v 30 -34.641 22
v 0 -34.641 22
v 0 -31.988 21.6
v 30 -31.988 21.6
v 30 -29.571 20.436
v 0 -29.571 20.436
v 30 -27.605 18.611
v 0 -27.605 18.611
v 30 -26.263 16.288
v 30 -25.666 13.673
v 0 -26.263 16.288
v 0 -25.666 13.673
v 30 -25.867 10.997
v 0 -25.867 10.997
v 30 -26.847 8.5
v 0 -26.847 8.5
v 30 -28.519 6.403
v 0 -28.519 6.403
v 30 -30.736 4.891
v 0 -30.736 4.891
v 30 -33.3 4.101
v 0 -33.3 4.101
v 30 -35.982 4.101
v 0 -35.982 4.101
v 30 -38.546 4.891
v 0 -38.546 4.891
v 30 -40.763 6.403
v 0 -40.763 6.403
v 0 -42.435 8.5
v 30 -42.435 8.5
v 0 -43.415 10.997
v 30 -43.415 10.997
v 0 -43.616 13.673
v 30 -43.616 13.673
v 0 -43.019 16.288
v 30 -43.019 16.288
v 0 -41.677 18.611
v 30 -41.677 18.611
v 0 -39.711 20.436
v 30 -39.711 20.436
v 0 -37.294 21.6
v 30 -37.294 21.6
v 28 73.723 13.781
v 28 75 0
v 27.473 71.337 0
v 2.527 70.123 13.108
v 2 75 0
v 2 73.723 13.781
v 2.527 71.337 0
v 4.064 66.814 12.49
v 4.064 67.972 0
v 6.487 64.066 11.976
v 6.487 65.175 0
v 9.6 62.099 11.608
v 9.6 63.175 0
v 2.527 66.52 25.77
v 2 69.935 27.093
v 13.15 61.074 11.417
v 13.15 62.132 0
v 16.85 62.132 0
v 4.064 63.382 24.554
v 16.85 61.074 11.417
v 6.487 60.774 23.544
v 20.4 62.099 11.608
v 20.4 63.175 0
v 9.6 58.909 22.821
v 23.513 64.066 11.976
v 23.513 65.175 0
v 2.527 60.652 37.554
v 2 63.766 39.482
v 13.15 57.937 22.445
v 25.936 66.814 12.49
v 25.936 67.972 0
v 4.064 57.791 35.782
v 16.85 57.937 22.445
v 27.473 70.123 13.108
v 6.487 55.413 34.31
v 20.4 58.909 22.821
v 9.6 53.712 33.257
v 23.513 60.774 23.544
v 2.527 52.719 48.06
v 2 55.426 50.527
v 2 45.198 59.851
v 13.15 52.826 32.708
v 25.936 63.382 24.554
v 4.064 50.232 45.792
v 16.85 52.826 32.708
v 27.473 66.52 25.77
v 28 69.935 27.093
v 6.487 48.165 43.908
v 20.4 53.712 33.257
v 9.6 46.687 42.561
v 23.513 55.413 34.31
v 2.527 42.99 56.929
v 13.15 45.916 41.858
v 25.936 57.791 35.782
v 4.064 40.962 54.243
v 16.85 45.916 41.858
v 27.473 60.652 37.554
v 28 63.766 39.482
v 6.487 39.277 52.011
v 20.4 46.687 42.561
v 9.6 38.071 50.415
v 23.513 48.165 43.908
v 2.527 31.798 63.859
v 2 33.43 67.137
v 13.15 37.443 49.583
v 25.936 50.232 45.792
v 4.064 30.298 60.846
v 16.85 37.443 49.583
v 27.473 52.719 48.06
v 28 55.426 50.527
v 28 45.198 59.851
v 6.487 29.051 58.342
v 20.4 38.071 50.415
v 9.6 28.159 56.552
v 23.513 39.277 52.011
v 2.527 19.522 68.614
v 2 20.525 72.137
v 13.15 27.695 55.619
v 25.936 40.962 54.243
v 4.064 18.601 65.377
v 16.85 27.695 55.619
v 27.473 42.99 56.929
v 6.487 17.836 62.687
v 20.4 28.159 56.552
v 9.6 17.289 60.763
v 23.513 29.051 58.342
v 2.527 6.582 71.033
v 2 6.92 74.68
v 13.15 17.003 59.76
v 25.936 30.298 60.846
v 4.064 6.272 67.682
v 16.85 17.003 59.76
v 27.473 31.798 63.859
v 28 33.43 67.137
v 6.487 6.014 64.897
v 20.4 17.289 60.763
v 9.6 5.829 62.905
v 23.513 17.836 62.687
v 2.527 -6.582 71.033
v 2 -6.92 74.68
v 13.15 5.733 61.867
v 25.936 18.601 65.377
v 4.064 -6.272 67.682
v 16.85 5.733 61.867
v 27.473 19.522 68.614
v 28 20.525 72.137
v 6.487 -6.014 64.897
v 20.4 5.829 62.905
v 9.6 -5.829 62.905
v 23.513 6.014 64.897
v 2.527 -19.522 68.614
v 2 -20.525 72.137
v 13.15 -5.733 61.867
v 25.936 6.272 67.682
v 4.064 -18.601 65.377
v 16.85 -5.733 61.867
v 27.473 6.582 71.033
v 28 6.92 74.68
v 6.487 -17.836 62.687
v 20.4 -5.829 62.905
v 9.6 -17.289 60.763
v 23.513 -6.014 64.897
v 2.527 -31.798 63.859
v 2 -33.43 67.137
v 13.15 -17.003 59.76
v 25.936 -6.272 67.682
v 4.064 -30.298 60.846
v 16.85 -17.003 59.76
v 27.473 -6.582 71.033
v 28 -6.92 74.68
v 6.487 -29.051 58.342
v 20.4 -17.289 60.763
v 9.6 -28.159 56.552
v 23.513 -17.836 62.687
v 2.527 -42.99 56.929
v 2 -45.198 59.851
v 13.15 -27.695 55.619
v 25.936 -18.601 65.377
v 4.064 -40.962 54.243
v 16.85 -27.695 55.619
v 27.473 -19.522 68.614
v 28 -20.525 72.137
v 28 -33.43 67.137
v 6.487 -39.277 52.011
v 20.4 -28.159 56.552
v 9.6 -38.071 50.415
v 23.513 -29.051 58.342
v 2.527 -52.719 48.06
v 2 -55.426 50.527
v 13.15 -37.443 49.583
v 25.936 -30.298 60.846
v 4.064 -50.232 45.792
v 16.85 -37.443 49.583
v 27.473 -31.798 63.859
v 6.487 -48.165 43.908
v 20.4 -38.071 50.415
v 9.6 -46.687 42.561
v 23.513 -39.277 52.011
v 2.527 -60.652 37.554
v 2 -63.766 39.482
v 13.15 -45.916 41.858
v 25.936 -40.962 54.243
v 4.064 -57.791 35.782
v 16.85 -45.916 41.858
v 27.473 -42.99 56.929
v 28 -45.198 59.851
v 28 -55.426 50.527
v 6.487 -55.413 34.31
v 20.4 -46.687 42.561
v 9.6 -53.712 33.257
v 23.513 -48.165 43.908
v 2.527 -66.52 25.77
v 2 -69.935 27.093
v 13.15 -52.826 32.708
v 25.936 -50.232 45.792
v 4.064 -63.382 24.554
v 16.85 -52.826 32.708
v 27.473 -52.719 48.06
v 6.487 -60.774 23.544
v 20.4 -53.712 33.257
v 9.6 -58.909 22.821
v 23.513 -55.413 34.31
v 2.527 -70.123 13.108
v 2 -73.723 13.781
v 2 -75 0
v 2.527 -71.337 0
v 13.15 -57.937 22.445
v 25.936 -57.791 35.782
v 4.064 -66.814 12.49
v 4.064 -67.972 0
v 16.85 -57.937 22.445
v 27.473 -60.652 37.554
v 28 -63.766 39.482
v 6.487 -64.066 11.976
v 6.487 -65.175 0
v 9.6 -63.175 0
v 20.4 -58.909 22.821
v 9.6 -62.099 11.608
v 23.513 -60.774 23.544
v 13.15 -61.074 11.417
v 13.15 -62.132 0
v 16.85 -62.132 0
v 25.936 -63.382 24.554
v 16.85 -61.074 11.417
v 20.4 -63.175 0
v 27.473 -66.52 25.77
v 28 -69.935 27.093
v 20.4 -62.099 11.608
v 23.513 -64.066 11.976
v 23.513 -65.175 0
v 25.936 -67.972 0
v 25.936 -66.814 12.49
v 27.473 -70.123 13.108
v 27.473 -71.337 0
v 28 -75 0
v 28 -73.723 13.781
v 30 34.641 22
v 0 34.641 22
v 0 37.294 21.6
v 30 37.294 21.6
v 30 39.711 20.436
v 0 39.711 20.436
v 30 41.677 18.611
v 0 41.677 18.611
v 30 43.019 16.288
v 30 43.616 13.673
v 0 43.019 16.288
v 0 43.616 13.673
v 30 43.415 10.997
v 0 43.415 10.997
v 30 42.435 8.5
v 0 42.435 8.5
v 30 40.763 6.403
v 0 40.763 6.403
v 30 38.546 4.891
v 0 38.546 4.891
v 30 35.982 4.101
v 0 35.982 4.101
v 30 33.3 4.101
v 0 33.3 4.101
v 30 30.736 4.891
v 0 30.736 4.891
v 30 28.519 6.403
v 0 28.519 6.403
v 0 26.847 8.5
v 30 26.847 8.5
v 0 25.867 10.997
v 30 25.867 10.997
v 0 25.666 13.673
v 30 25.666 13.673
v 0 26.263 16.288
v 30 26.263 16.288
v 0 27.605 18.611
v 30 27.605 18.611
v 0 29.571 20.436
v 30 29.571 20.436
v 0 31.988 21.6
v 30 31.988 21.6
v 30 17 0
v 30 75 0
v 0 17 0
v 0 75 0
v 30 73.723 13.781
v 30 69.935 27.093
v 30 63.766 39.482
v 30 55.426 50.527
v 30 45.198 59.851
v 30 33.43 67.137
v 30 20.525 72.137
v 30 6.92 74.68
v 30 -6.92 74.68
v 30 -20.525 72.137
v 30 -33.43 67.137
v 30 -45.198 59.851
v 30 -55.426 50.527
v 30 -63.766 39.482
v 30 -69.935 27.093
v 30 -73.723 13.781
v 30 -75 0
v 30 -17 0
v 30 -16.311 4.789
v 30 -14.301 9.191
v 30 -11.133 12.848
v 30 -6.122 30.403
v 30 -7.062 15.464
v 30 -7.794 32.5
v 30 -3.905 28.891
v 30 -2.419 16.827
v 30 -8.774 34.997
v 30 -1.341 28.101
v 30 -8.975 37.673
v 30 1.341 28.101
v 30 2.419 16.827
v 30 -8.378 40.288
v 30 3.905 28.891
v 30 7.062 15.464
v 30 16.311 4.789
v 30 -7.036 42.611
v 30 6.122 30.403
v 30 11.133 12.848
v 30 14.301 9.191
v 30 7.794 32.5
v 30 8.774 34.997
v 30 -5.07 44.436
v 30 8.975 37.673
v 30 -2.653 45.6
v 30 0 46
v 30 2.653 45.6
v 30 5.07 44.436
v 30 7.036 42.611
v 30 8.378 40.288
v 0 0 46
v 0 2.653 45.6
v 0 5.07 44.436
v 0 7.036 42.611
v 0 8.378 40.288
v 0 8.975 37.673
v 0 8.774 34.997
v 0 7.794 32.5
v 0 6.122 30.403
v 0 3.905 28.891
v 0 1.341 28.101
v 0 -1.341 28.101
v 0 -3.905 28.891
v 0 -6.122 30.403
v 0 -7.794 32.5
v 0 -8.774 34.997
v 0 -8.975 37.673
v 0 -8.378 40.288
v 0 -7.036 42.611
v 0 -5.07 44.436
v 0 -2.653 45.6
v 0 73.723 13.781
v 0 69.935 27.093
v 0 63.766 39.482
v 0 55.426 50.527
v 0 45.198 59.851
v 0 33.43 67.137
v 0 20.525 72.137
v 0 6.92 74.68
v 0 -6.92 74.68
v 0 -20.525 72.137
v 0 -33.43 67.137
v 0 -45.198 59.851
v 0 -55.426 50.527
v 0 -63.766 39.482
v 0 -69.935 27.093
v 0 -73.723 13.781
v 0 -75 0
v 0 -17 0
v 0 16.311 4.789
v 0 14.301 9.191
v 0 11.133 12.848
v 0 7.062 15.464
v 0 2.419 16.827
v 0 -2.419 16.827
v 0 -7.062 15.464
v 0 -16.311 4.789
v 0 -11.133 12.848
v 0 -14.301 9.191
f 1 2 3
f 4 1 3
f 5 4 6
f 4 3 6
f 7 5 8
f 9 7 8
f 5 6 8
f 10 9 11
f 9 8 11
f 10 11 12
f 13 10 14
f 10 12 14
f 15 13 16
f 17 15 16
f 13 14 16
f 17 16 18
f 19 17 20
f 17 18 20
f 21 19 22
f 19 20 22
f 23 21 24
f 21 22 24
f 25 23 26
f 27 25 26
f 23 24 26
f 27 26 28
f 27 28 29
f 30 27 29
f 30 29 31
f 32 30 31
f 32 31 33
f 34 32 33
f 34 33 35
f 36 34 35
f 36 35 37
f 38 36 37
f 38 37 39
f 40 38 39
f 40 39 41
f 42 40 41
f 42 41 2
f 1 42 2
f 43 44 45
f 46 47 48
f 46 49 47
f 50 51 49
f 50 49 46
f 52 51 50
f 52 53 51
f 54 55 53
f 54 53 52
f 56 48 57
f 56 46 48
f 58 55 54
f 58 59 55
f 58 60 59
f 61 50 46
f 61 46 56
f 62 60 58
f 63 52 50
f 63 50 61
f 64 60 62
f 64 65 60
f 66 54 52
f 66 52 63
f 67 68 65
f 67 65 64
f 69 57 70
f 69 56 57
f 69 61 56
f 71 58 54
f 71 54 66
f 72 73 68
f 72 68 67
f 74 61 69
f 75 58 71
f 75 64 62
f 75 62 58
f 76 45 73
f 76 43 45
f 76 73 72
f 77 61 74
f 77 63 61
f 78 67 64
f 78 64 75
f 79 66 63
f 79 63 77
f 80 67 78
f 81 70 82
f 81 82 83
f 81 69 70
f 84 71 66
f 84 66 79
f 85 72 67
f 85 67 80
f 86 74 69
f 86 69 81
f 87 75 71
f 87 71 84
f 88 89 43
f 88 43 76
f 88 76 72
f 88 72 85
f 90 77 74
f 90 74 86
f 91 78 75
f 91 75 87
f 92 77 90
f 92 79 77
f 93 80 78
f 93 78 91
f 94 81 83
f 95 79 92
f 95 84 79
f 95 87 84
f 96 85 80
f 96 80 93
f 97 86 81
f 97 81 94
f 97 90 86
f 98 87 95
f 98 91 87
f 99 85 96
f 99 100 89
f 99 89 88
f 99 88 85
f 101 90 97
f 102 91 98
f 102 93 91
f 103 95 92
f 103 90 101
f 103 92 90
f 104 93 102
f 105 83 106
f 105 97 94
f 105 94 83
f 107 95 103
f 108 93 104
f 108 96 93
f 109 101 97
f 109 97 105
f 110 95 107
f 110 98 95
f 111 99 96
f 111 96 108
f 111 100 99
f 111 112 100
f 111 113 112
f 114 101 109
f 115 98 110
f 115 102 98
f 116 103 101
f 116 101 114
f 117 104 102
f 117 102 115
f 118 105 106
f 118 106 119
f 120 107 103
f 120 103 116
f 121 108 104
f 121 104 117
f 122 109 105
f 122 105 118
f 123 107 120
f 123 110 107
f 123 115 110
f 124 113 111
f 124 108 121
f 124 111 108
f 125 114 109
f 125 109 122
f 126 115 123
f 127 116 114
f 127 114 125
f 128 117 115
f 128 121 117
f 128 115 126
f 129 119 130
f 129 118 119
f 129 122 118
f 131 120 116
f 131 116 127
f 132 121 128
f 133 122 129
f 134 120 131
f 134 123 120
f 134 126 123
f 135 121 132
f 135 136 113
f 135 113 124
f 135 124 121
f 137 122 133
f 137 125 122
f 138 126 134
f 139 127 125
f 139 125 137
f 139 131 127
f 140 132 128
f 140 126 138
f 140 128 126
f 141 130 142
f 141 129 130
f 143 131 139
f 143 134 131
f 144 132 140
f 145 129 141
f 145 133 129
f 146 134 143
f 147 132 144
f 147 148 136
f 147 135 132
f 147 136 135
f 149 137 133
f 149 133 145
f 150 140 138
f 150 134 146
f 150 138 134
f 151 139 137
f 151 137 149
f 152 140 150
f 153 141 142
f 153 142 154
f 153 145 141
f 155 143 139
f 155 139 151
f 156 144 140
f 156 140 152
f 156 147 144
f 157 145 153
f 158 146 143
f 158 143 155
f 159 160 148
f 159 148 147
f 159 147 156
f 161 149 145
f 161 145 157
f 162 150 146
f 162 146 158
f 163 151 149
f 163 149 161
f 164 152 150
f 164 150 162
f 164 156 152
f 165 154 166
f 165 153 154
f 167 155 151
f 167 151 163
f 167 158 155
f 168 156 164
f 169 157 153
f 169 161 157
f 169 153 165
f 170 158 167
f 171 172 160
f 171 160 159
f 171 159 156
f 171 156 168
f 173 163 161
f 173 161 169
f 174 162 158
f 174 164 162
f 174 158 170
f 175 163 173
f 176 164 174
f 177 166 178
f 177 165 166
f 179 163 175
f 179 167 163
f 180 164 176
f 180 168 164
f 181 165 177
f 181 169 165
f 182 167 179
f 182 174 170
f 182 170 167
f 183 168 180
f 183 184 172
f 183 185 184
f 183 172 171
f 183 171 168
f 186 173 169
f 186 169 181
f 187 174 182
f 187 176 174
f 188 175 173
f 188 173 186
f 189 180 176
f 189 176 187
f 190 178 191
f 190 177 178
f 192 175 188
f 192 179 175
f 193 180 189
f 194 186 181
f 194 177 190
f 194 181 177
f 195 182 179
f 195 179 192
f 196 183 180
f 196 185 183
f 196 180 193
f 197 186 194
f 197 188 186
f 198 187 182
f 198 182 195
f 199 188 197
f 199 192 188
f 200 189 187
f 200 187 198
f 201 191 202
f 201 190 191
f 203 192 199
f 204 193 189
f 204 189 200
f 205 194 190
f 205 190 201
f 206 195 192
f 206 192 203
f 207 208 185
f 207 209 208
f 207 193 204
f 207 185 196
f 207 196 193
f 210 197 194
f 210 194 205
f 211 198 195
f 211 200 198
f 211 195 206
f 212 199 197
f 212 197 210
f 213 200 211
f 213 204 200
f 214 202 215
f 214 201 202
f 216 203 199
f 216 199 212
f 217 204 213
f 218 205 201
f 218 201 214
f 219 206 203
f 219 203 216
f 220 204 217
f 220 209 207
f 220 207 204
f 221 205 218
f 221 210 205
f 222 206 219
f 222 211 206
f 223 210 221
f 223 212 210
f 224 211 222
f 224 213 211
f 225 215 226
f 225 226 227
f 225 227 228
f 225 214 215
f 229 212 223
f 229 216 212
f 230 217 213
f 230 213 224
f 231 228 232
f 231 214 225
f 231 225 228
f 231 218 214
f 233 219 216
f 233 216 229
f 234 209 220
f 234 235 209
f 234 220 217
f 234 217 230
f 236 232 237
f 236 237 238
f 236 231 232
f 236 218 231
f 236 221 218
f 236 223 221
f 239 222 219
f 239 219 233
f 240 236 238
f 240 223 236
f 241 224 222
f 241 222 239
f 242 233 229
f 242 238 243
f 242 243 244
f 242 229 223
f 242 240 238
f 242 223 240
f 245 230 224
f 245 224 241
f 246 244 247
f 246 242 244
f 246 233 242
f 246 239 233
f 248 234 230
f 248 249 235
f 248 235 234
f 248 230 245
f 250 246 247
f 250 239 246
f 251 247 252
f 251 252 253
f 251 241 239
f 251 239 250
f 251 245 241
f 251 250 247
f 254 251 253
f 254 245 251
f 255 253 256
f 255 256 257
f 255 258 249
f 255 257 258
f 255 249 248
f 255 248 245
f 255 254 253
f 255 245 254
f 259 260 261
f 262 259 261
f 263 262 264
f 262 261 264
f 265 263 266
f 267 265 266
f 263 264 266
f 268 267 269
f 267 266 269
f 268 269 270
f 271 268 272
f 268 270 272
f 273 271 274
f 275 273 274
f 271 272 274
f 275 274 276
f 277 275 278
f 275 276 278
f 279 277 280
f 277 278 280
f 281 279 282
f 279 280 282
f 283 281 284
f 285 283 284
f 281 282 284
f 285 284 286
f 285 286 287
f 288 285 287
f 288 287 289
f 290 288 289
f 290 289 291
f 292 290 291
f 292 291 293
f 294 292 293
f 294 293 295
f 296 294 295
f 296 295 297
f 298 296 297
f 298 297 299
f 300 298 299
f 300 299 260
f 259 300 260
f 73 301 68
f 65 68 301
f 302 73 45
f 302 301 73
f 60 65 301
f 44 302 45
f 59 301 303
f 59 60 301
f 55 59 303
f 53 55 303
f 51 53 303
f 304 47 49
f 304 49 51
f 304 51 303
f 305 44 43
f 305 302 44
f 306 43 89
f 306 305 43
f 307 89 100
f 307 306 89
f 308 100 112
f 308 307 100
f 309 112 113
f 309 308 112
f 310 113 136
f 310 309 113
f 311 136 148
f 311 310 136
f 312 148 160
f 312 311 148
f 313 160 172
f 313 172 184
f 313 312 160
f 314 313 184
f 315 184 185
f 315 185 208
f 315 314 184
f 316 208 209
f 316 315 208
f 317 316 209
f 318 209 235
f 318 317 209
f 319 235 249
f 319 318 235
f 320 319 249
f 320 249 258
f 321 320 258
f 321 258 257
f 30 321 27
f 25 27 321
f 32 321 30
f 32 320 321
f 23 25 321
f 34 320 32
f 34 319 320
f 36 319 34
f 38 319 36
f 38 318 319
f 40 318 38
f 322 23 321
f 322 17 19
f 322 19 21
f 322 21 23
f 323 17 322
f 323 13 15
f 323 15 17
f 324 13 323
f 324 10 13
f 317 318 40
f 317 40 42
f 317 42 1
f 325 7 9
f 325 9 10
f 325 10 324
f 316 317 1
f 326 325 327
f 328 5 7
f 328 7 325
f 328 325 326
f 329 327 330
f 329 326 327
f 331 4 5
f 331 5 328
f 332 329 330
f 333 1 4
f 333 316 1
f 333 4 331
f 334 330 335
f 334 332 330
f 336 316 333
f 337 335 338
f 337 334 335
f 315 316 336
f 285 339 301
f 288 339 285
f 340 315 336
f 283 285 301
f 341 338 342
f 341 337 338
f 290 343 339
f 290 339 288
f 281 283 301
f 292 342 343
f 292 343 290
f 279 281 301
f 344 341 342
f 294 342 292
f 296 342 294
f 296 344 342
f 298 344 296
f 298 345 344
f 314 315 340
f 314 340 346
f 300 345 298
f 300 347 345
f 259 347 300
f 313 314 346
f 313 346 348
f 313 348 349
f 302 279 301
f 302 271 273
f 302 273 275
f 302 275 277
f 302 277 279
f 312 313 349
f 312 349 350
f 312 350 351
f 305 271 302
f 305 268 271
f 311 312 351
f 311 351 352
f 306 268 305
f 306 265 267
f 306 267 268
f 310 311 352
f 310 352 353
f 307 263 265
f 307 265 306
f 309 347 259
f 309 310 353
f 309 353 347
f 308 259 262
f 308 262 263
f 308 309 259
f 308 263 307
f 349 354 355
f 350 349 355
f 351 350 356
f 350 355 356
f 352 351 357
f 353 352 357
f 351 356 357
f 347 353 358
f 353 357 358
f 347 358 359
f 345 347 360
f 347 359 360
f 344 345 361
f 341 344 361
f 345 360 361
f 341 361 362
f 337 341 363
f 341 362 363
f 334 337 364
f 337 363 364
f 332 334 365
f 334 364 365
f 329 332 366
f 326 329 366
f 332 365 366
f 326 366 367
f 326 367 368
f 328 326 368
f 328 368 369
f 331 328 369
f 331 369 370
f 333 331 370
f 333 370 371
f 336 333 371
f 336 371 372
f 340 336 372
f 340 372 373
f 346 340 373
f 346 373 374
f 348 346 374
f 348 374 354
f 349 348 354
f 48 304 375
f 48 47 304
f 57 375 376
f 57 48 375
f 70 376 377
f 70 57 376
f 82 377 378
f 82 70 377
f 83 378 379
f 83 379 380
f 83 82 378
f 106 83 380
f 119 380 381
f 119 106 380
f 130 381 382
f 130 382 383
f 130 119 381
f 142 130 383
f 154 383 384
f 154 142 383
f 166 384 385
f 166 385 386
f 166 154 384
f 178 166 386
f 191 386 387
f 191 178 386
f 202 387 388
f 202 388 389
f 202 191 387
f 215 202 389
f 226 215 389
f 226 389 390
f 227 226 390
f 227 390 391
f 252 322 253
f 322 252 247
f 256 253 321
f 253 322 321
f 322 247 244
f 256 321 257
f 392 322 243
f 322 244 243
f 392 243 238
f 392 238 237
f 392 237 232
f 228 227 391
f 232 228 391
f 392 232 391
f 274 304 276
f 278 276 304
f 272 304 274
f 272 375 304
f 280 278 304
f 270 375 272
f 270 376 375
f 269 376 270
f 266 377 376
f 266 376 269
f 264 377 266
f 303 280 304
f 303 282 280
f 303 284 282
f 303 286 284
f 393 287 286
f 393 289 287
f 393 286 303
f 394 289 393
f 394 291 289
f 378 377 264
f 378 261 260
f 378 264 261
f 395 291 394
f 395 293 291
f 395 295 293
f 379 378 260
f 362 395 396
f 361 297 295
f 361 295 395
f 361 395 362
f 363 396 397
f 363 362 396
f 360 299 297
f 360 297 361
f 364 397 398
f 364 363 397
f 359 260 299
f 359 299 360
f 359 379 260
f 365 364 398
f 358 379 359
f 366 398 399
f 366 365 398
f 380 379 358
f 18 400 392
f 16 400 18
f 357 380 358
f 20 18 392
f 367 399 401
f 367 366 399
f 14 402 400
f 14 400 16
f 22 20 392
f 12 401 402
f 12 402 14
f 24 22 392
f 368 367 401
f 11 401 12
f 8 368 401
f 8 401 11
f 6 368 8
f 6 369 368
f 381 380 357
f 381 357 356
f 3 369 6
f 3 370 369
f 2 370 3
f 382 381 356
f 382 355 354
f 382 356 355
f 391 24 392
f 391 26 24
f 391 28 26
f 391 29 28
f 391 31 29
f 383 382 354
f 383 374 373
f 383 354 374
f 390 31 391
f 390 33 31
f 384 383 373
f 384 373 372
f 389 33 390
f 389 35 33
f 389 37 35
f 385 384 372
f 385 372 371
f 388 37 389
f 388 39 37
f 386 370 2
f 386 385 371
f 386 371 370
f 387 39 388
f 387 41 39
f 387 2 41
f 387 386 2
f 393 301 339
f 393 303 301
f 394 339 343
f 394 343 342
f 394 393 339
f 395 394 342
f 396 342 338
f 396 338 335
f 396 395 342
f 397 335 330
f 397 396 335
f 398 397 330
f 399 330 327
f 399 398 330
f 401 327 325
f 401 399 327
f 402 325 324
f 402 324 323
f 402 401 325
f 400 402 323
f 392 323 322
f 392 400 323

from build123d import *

# Parameters (mm, degrees)
R_VOLUTION1_ANGLE       = 180
ESQUISSE2_R             = 9
ENL_V_MAT_EXTRU_1_DEPTH = 31


with BuildPart() as part:
    # Esquisse1 → Révolution1 (revolve)
    with BuildSketch(Plane.XY):
        with BuildLine():
            Line((0, 17), (0, 75))
            Line((0, 75), (2, 75))
            ThreePointArc((2, 75), (15, 62), (28, 75))
            Line((28, 75), (30, 75))
            Line((30, 75), (30, 17))
            Line((30, 17), (0, 17))
        make_face()
    revolve(axis=Axis((0, 0, 0), (1, 0, 0)), revolution_arc=R_VOLUTION1_ANGLE)

    # Esquisse2 → Enlèv. mat.-Extru.1 (cut, through all)
    with BuildSketch(Plane.ZY):
        with Locations((37, 0)):
            Circle(ESQUISSE2_R)
        with Locations((13, -34.641016151)):
            Circle(ESQUISSE2_R)
        with Locations((13, 34.641016151)):
            Circle(ESQUISSE2_R)
    extrude(amount=-ENL_V_MAT_EXTRU_1_DEPTH, mode=Mode.SUBTRACT)


solid = part.part
